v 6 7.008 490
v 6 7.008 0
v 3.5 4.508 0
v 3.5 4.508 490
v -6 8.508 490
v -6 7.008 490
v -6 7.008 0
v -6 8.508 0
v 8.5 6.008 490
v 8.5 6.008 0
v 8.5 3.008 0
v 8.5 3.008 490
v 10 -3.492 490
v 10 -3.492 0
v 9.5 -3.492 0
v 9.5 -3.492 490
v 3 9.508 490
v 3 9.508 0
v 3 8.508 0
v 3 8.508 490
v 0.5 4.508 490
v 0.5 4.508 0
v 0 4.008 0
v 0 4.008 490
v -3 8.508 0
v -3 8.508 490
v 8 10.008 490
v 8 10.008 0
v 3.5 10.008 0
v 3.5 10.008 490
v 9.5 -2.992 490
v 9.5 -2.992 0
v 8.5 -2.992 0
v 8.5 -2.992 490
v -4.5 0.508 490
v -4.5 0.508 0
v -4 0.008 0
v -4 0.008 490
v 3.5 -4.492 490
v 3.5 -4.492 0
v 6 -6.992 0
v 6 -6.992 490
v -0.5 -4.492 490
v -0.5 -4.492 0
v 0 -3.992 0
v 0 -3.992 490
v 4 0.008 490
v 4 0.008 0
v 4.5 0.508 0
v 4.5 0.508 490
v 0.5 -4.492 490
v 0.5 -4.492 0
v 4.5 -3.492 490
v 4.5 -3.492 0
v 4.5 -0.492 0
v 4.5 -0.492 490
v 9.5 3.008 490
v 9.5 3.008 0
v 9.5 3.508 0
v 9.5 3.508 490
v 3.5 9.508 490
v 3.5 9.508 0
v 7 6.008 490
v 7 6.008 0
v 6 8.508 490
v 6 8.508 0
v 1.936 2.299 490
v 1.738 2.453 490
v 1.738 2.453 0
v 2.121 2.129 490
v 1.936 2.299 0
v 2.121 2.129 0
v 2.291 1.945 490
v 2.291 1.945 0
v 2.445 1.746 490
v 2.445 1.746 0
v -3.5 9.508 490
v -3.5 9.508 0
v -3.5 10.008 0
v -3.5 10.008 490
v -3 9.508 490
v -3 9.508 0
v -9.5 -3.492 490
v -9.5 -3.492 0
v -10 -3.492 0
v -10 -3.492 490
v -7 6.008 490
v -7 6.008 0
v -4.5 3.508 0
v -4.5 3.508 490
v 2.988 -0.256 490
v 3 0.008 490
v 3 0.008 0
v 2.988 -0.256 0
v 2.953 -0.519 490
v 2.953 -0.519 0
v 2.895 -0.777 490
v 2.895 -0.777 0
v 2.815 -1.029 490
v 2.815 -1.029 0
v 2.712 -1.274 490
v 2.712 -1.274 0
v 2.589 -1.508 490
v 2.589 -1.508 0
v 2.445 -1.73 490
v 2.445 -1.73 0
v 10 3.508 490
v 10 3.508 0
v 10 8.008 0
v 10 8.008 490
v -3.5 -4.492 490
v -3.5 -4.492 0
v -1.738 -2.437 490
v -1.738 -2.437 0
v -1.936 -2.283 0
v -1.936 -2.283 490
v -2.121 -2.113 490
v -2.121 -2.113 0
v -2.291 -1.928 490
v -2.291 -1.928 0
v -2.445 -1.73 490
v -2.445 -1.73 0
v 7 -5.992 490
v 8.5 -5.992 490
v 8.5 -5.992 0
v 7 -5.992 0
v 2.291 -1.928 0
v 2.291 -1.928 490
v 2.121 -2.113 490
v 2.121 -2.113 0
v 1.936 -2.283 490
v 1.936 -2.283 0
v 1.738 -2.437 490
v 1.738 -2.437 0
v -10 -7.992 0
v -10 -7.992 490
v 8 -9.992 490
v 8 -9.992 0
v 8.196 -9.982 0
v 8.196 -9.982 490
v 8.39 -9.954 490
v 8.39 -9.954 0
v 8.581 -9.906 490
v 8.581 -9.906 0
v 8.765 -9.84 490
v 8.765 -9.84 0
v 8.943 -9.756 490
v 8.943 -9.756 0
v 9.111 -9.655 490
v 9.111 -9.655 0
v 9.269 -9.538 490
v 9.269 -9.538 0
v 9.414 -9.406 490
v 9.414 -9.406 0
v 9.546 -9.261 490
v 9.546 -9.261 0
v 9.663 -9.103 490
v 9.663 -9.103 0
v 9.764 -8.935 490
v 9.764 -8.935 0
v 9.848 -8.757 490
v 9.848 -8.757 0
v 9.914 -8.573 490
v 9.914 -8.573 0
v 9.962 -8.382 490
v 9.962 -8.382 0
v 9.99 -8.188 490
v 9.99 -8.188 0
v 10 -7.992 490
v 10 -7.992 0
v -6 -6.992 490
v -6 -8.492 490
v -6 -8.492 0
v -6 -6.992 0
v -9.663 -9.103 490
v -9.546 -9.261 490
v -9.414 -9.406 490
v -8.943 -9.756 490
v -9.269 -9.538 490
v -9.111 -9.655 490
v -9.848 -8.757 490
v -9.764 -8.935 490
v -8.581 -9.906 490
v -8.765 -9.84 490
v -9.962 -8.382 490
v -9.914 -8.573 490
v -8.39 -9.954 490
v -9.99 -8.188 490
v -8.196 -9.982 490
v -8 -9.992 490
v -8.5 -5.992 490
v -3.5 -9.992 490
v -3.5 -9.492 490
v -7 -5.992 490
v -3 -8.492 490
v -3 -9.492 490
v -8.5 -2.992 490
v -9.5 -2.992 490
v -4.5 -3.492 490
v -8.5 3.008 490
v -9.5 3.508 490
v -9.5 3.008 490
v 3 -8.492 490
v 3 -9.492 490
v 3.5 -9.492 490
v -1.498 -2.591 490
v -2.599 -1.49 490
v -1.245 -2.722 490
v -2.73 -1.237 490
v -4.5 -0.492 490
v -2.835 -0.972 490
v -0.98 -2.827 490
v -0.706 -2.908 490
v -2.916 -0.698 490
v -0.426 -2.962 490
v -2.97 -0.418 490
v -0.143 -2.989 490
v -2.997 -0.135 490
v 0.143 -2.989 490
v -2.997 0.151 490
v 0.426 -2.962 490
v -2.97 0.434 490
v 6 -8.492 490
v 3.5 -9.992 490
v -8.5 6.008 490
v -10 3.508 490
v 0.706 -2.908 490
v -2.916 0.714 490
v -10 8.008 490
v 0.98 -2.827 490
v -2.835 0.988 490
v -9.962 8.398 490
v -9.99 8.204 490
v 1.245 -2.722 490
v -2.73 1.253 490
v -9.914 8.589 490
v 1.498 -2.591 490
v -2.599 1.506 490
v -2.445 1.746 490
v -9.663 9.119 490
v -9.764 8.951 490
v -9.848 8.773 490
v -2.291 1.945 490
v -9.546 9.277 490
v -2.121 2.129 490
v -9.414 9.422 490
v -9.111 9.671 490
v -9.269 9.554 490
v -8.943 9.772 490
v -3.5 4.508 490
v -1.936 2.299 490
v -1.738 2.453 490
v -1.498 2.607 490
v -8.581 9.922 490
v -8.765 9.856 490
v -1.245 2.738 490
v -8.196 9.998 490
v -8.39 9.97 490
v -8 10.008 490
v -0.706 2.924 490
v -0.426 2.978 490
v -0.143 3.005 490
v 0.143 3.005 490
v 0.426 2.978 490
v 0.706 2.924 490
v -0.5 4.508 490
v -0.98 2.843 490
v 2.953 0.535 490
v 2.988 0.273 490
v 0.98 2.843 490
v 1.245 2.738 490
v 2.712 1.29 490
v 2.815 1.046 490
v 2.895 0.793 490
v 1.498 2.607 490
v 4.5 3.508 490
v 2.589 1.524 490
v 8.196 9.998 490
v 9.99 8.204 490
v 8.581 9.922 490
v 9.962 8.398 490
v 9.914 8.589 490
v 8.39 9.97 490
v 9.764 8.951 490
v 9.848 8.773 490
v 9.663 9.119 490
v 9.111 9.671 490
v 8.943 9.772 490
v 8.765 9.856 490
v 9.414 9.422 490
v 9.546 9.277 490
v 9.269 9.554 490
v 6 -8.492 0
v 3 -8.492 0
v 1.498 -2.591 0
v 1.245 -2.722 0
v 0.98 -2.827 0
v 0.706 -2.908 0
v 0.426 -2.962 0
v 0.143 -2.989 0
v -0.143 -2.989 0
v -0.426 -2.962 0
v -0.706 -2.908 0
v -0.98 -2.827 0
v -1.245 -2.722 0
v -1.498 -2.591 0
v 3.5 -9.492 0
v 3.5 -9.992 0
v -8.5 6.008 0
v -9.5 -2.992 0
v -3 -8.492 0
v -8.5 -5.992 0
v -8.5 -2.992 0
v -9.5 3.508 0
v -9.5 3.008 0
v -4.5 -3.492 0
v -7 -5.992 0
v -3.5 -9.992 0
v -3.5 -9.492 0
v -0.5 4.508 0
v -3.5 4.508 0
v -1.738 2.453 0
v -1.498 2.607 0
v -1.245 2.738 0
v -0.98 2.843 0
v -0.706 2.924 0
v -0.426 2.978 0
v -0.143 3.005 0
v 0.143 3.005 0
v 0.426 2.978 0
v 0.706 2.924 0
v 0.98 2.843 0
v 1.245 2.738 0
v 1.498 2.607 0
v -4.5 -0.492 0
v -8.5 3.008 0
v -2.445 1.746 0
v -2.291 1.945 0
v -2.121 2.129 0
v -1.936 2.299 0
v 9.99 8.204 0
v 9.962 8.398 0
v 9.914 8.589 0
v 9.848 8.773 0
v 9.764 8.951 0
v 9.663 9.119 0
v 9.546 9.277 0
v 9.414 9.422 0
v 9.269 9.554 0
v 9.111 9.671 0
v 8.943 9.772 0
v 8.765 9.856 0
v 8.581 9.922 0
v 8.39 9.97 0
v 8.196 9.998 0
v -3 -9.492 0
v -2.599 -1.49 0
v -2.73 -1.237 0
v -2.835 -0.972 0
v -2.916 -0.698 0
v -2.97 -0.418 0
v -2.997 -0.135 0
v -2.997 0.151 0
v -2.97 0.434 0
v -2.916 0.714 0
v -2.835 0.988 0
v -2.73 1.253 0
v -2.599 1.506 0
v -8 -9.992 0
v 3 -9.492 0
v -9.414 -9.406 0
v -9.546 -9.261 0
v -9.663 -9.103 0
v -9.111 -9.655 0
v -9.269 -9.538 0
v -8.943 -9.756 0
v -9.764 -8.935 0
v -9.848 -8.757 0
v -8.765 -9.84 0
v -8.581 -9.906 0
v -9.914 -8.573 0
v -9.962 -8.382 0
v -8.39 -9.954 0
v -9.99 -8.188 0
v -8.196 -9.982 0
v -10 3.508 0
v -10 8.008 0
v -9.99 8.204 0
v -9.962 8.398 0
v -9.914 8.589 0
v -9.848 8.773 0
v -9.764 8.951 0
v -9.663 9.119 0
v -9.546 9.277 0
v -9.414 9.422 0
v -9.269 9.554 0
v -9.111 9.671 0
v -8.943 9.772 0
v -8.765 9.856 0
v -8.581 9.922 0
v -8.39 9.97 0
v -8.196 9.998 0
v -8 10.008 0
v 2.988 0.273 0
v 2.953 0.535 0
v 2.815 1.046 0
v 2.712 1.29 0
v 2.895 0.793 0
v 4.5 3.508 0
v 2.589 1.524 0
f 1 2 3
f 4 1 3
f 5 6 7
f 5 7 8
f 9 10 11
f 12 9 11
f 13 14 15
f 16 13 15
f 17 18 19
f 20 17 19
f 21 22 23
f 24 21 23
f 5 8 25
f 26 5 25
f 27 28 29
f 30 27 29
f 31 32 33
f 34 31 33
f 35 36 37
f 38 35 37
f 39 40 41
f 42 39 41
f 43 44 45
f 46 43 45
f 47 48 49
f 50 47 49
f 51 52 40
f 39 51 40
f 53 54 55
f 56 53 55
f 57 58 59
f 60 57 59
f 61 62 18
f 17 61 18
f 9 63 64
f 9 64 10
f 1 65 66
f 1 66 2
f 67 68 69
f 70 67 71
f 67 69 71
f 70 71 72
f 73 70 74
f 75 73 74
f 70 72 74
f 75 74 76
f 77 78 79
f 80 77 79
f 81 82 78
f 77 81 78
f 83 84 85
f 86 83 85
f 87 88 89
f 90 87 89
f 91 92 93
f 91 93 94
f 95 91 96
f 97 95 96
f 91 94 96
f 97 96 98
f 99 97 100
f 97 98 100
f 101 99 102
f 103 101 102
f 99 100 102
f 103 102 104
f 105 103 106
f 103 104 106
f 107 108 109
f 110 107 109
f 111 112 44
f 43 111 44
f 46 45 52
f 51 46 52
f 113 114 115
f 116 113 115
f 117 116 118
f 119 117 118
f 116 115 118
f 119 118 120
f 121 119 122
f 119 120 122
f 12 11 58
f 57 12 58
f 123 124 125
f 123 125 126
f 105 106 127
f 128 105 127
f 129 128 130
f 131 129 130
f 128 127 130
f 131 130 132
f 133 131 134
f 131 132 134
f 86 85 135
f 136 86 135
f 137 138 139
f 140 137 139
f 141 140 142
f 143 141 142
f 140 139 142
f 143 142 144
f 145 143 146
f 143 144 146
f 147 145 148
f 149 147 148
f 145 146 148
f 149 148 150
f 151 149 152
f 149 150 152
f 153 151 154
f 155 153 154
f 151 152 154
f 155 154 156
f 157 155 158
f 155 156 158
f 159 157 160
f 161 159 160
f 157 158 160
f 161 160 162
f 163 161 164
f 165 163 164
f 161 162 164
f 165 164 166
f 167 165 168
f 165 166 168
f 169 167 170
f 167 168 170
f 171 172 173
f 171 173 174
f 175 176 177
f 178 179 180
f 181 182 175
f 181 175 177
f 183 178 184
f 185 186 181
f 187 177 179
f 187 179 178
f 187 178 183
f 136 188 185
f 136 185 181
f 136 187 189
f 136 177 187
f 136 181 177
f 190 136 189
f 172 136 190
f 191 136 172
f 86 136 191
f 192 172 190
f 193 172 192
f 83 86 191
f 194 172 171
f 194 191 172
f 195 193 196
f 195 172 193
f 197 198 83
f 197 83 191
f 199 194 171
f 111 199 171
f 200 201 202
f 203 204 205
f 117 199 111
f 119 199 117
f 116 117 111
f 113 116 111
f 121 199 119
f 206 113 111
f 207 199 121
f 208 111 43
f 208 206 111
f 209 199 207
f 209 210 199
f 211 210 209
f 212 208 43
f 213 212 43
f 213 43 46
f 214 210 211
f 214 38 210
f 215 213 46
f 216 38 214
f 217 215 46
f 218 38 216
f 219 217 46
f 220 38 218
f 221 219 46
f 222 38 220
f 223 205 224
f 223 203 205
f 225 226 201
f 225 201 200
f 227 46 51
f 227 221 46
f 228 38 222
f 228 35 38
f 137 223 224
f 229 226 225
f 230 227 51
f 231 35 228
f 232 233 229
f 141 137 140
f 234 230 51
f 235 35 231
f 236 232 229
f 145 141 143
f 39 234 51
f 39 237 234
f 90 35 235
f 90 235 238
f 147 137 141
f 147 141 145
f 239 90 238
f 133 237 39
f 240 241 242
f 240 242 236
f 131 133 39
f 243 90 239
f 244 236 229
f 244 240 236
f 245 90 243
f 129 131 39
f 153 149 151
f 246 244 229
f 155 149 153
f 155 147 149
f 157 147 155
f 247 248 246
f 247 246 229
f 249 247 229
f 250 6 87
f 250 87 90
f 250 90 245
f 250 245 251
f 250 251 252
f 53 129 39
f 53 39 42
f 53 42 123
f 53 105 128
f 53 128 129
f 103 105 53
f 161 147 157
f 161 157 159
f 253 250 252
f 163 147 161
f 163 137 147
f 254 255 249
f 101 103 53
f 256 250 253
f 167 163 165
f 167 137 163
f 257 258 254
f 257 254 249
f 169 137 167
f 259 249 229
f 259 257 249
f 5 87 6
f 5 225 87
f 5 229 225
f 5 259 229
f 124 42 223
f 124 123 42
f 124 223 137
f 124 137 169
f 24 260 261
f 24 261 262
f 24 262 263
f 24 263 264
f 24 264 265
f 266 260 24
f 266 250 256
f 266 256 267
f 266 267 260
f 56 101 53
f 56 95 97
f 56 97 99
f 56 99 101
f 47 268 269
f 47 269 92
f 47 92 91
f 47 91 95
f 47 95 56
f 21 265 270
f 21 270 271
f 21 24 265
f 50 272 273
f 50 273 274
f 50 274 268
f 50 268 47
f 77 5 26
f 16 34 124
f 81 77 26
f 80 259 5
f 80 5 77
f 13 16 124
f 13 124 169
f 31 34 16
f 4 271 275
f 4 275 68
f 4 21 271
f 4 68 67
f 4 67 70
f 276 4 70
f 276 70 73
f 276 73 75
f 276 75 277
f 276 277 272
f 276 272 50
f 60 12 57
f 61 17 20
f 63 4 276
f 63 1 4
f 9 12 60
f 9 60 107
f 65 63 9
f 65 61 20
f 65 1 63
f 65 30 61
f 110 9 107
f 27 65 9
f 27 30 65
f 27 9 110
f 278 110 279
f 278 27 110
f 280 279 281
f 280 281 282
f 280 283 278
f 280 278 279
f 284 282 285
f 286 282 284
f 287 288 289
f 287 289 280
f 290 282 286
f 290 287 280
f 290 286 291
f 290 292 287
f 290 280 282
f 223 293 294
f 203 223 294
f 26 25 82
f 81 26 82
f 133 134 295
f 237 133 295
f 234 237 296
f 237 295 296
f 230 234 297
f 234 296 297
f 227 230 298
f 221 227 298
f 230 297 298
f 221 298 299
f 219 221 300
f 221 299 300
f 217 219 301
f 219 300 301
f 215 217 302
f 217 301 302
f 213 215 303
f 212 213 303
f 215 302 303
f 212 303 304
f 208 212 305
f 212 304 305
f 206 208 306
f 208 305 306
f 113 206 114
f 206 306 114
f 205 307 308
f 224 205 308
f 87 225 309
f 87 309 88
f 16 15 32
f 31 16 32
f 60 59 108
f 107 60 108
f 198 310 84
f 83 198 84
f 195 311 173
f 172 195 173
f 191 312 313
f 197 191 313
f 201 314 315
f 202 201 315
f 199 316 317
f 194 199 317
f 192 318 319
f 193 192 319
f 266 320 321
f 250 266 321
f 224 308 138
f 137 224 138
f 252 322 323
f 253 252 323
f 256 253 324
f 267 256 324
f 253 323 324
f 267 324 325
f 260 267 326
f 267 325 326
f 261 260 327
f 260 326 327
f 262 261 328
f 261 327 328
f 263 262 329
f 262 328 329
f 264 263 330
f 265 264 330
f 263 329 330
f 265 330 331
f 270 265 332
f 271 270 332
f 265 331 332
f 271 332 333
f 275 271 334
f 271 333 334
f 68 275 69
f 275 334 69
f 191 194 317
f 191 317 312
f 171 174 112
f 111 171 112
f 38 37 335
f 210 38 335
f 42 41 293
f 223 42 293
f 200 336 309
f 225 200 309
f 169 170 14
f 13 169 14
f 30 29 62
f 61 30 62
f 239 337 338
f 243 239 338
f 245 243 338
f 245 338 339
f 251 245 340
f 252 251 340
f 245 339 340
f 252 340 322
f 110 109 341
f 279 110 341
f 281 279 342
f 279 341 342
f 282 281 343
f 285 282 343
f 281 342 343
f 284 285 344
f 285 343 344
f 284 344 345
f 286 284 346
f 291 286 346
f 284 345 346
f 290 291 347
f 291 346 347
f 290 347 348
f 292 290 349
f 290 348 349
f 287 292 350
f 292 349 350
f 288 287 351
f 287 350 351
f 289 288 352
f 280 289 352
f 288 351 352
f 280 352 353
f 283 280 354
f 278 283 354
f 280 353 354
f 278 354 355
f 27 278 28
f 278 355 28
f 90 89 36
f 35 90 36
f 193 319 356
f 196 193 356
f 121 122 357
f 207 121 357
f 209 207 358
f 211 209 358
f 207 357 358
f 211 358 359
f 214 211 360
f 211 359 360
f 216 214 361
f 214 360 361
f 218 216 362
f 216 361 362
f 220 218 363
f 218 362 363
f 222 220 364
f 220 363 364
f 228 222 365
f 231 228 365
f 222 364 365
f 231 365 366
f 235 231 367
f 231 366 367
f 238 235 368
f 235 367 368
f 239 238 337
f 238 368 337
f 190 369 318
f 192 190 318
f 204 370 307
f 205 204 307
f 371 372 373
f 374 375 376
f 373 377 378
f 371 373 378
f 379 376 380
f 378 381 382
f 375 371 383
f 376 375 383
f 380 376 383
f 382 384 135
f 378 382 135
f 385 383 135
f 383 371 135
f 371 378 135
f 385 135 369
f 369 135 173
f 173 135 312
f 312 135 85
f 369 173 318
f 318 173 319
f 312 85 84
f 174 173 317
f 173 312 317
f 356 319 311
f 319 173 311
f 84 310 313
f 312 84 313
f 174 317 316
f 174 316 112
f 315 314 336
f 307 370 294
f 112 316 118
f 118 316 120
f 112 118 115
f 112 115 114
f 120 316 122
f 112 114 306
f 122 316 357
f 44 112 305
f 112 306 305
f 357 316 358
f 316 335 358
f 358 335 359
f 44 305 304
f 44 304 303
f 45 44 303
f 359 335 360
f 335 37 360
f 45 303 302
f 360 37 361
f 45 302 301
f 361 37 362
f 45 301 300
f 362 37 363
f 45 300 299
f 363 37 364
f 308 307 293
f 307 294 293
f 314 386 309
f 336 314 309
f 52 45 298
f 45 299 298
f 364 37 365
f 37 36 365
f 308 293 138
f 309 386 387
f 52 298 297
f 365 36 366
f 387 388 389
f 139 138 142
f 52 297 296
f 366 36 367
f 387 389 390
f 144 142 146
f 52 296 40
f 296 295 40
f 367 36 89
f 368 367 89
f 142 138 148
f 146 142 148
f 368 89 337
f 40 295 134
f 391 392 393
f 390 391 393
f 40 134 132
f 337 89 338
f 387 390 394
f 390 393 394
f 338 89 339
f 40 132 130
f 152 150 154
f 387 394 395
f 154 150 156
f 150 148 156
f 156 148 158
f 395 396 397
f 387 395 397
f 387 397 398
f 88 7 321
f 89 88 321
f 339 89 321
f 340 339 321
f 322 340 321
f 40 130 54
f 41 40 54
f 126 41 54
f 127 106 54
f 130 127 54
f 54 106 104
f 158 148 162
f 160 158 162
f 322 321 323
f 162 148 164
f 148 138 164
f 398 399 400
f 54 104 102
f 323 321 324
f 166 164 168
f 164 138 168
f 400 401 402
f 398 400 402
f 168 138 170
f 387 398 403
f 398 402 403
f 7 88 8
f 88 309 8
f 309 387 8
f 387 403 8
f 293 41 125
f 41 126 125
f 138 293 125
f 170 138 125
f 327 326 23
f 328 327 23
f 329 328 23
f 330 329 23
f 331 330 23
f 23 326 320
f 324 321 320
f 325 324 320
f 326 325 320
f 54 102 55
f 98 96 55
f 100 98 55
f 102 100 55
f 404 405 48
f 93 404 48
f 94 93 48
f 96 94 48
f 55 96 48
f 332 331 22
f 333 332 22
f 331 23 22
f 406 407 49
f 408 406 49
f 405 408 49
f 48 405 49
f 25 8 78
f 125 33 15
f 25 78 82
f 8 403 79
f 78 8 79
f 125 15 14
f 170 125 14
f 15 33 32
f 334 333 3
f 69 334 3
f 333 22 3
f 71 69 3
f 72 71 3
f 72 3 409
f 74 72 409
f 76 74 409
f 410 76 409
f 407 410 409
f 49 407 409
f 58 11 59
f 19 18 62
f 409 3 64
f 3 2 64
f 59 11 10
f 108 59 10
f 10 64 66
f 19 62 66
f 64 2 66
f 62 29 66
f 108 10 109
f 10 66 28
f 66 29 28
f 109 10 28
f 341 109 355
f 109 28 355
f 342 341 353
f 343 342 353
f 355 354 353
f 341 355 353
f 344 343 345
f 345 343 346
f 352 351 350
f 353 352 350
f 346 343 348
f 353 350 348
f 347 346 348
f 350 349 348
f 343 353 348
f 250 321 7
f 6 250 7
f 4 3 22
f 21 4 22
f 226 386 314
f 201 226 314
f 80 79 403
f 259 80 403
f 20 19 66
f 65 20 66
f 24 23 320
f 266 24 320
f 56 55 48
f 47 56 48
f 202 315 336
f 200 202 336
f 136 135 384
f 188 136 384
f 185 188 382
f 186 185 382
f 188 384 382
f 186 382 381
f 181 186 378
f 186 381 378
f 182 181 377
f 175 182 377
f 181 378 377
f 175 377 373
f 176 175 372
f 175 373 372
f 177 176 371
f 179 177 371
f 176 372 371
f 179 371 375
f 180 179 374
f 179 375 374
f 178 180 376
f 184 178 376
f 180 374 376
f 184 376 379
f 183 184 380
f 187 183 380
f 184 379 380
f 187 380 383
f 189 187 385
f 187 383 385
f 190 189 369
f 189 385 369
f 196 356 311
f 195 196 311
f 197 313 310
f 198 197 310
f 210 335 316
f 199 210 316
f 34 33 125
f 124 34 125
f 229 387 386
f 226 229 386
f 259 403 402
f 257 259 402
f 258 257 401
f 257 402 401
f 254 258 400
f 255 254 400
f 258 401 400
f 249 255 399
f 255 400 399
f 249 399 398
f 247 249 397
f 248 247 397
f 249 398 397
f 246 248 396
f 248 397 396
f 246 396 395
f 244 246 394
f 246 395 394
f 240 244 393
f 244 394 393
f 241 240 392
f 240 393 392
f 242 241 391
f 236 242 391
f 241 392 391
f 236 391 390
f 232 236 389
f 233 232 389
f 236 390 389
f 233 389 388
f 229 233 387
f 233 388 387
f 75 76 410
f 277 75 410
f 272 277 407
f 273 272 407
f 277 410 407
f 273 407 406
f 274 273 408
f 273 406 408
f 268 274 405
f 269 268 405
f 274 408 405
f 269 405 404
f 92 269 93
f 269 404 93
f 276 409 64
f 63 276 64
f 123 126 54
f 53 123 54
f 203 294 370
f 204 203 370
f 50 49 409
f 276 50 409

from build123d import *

# Parameters (mm, degrees)
F1_DEPTH = 490


with BuildPart() as f1:
    # F0 (on Top) → F1 (new body)
    with BuildSketch(Plane.XY):
        with BuildLine():
            ThreePointArc((-10, -7.991953), (-9.414214, -9.406167), (-8, -9.991953))
            Line((-8, -9.991953), (-3.5, -9.991953))
            Line((-3.5, -9.991953), (-3.5, -9.491953))
            Line((-3.5, -9.491953), (-3, -9.491953))
            Line((-3, -9.491953), (-3, -8.491953))
            Line((-3, -8.491953), (-6, -8.491953))
            Line((-6, -8.491953), (-6, -6.991953))
            Line((-6, -6.991953), (-3.5, -4.491953))
            Line((-3.5, -4.491953), (-0.5, -4.491953))
            Line((-0.5, -4.491953), (0, -3.991953))
            Line((0, -3.991953), (0.5, -4.491953))
            Line((0.5, -4.491953), (3.5, -4.491953))
            Line((3.5, -4.491953), (6, -6.991953))
            Line((6, -6.991953), (6, -8.491953))
            Line((6, -8.491953), (3, -8.491953))
            Line((3, -8.491953), (3, -9.491953))
            Line((3, -9.491953), (3.5, -9.491953))
            Line((3.5, -9.491953), (3.5, -9.991953))
            Line((3.5, -9.991953), (8, -9.991953))
            ThreePointArc((8, -9.991953), (9.414214, -9.406167), (10, -7.991953))
            Line((10, -7.991953), (10, -3.491953))
            Line((10, -3.491953), (9.5, -3.491953))
            Line((9.5, -3.491953), (9.5, -2.991953))
            Line((9.5, -2.991953), (8.5, -2.991953))
            Line((8.5, -2.991953), (8.5, -5.991953))
            Line((8.5, -5.991953), (7, -5.991953))
            Line((7, -5.991953), (4.5, -3.491953))
            Line((4.5, -3.491953), (4.5, -0.491953))
            Line((4.5, -0.491953), (4, 0.008047))
            Line((4, 0.008047), (4.5, 0.508047))
            Line((4.5, 0.508047), (4.5, 3.508047))
            Line((4.5, 3.508047), (7, 6.008047))
            Line((7, 6.008047), (8.5, 6.008047))
            Line((8.5, 6.008047), (8.5, 3.008047))
            Line((8.5, 3.008047), (9.5, 3.008047))
            Line((9.5, 3.008047), (9.5, 3.508047))
            Line((9.5, 3.508047), (10, 3.508047))
            Line((10, 3.508047), (10, 8.008047))
            ThreePointArc((10, 8.008047), (9.414214, 9.422261), (8, 10.008047))
            Line((8, 10.008047), (3.5, 10.008047))
            Line((3.5, 10.008047), (3.5, 9.508047))
            Line((3.5, 9.508047), (3, 9.508047))
            Line((3, 9.508047), (3, 8.508047))
            Line((3, 8.508047), (6, 8.508047))
            Line((6, 8.508047), (6, 7.008047))
            Line((6, 7.008047), (3.5, 4.508047))
            Line((3.5, 4.508047), (0.5, 4.508047))
            Line((0.5, 4.508047), (0, 4.008047))
            Line((0, 4.008047), (-0.5, 4.508047))
            Line((-0.5, 4.508047), (-3.5, 4.508047))
            Line((-3.5, 4.508047), (-6, 7.008047))
            Line((-6, 7.008047), (-6, 8.508047))
            Line((-6, 8.508047), (-3, 8.508047))
            Line((-3, 8.508047), (-3, 9.508047))
            Line((-3, 9.508047), (-3.5, 9.508047))
            Line((-3.5, 9.508047), (-3.5, 10.008047))
            Line((-3.5, 10.008047), (-8, 10.008047))
            ThreePointArc((-8, 10.008047), (-9.414214, 9.422261), (-10, 8.008047))
            Line((-10, 8.008047), (-10, 3.508047))
            Line((-10, 3.508047), (-9.5, 3.508047))
            Line((-9.5, 3.508047), (-9.5, 3.008047))
            Line((-9.5, 3.008047), (-8.5, 3.008047))
            Line((-8.5, 3.008047), (-8.5, 6.008047))
            Line((-8.5, 6.008047), (-7, 6.008047))
            Line((-7, 6.008047), (-4.5, 3.508047))
            Line((-4.5, 3.508047), (-4.5, 0.508047))
            Line((-4.5, 0.508047), (-4, 0.008047))
            Line((-4, 0.008047), (-4.5, -0.491953))
            Line((-4.5, -0.491953), (-4.5, -3.491953))
            Line((-4.5, -3.491953), (-7, -5.991953))
            Line((-7, -5.991953), (-8.5, -5.991953))
            Line((-8.5, -5.991953), (-8.5, -2.991953))
            Line((-8.5, -2.991953), (-9.5, -2.991953))
            Line((-9.5, -2.991953), (-9.5, -3.491953))
            Line((-9.5, -3.491953), (-10, -3.491953))
            Line((-10, -3.491953), (-10, -7.991953))
        make_face()
        with BuildLine():
            ThreePointArc((2.445203, 1.746144), (2.857937, 0.920294), (3, 0.008047))
            ThreePointArc((3, 0.008047), (2.857937, -0.9042), (2.445203, -1.73005))
            ThreePointArc((2.445203, -1.73005), (2.12132, -2.113273), (1.738097, -2.437156))
            ThreePointArc((1.738097, -2.437156), (0, -2.991953), (-1.738097, -2.437156))
            ThreePointArc((-1.738097, -2.437156), (-2.12132, -2.113273), (-2.445203, -1.73005))
            ThreePointArc((-2.445203, -1.73005), (-3, 0.008047), (-2.445203, 1.746144))
            ThreePointArc((-2.445203, 1.746144), (-2.12132, 2.129367), (-1.738097, 2.45325))
            ThreePointArc((-1.738097, 2.45325), (0, 3.008047), (1.738097, 2.45325))
            ThreePointArc((1.738097, 2.45325), (2.12132, 2.129367), (2.445203, 1.746144))
        make_face(mode=Mode.SUBTRACT)
    extrude(amount=F1_DEPTH)


solid = f1.part
